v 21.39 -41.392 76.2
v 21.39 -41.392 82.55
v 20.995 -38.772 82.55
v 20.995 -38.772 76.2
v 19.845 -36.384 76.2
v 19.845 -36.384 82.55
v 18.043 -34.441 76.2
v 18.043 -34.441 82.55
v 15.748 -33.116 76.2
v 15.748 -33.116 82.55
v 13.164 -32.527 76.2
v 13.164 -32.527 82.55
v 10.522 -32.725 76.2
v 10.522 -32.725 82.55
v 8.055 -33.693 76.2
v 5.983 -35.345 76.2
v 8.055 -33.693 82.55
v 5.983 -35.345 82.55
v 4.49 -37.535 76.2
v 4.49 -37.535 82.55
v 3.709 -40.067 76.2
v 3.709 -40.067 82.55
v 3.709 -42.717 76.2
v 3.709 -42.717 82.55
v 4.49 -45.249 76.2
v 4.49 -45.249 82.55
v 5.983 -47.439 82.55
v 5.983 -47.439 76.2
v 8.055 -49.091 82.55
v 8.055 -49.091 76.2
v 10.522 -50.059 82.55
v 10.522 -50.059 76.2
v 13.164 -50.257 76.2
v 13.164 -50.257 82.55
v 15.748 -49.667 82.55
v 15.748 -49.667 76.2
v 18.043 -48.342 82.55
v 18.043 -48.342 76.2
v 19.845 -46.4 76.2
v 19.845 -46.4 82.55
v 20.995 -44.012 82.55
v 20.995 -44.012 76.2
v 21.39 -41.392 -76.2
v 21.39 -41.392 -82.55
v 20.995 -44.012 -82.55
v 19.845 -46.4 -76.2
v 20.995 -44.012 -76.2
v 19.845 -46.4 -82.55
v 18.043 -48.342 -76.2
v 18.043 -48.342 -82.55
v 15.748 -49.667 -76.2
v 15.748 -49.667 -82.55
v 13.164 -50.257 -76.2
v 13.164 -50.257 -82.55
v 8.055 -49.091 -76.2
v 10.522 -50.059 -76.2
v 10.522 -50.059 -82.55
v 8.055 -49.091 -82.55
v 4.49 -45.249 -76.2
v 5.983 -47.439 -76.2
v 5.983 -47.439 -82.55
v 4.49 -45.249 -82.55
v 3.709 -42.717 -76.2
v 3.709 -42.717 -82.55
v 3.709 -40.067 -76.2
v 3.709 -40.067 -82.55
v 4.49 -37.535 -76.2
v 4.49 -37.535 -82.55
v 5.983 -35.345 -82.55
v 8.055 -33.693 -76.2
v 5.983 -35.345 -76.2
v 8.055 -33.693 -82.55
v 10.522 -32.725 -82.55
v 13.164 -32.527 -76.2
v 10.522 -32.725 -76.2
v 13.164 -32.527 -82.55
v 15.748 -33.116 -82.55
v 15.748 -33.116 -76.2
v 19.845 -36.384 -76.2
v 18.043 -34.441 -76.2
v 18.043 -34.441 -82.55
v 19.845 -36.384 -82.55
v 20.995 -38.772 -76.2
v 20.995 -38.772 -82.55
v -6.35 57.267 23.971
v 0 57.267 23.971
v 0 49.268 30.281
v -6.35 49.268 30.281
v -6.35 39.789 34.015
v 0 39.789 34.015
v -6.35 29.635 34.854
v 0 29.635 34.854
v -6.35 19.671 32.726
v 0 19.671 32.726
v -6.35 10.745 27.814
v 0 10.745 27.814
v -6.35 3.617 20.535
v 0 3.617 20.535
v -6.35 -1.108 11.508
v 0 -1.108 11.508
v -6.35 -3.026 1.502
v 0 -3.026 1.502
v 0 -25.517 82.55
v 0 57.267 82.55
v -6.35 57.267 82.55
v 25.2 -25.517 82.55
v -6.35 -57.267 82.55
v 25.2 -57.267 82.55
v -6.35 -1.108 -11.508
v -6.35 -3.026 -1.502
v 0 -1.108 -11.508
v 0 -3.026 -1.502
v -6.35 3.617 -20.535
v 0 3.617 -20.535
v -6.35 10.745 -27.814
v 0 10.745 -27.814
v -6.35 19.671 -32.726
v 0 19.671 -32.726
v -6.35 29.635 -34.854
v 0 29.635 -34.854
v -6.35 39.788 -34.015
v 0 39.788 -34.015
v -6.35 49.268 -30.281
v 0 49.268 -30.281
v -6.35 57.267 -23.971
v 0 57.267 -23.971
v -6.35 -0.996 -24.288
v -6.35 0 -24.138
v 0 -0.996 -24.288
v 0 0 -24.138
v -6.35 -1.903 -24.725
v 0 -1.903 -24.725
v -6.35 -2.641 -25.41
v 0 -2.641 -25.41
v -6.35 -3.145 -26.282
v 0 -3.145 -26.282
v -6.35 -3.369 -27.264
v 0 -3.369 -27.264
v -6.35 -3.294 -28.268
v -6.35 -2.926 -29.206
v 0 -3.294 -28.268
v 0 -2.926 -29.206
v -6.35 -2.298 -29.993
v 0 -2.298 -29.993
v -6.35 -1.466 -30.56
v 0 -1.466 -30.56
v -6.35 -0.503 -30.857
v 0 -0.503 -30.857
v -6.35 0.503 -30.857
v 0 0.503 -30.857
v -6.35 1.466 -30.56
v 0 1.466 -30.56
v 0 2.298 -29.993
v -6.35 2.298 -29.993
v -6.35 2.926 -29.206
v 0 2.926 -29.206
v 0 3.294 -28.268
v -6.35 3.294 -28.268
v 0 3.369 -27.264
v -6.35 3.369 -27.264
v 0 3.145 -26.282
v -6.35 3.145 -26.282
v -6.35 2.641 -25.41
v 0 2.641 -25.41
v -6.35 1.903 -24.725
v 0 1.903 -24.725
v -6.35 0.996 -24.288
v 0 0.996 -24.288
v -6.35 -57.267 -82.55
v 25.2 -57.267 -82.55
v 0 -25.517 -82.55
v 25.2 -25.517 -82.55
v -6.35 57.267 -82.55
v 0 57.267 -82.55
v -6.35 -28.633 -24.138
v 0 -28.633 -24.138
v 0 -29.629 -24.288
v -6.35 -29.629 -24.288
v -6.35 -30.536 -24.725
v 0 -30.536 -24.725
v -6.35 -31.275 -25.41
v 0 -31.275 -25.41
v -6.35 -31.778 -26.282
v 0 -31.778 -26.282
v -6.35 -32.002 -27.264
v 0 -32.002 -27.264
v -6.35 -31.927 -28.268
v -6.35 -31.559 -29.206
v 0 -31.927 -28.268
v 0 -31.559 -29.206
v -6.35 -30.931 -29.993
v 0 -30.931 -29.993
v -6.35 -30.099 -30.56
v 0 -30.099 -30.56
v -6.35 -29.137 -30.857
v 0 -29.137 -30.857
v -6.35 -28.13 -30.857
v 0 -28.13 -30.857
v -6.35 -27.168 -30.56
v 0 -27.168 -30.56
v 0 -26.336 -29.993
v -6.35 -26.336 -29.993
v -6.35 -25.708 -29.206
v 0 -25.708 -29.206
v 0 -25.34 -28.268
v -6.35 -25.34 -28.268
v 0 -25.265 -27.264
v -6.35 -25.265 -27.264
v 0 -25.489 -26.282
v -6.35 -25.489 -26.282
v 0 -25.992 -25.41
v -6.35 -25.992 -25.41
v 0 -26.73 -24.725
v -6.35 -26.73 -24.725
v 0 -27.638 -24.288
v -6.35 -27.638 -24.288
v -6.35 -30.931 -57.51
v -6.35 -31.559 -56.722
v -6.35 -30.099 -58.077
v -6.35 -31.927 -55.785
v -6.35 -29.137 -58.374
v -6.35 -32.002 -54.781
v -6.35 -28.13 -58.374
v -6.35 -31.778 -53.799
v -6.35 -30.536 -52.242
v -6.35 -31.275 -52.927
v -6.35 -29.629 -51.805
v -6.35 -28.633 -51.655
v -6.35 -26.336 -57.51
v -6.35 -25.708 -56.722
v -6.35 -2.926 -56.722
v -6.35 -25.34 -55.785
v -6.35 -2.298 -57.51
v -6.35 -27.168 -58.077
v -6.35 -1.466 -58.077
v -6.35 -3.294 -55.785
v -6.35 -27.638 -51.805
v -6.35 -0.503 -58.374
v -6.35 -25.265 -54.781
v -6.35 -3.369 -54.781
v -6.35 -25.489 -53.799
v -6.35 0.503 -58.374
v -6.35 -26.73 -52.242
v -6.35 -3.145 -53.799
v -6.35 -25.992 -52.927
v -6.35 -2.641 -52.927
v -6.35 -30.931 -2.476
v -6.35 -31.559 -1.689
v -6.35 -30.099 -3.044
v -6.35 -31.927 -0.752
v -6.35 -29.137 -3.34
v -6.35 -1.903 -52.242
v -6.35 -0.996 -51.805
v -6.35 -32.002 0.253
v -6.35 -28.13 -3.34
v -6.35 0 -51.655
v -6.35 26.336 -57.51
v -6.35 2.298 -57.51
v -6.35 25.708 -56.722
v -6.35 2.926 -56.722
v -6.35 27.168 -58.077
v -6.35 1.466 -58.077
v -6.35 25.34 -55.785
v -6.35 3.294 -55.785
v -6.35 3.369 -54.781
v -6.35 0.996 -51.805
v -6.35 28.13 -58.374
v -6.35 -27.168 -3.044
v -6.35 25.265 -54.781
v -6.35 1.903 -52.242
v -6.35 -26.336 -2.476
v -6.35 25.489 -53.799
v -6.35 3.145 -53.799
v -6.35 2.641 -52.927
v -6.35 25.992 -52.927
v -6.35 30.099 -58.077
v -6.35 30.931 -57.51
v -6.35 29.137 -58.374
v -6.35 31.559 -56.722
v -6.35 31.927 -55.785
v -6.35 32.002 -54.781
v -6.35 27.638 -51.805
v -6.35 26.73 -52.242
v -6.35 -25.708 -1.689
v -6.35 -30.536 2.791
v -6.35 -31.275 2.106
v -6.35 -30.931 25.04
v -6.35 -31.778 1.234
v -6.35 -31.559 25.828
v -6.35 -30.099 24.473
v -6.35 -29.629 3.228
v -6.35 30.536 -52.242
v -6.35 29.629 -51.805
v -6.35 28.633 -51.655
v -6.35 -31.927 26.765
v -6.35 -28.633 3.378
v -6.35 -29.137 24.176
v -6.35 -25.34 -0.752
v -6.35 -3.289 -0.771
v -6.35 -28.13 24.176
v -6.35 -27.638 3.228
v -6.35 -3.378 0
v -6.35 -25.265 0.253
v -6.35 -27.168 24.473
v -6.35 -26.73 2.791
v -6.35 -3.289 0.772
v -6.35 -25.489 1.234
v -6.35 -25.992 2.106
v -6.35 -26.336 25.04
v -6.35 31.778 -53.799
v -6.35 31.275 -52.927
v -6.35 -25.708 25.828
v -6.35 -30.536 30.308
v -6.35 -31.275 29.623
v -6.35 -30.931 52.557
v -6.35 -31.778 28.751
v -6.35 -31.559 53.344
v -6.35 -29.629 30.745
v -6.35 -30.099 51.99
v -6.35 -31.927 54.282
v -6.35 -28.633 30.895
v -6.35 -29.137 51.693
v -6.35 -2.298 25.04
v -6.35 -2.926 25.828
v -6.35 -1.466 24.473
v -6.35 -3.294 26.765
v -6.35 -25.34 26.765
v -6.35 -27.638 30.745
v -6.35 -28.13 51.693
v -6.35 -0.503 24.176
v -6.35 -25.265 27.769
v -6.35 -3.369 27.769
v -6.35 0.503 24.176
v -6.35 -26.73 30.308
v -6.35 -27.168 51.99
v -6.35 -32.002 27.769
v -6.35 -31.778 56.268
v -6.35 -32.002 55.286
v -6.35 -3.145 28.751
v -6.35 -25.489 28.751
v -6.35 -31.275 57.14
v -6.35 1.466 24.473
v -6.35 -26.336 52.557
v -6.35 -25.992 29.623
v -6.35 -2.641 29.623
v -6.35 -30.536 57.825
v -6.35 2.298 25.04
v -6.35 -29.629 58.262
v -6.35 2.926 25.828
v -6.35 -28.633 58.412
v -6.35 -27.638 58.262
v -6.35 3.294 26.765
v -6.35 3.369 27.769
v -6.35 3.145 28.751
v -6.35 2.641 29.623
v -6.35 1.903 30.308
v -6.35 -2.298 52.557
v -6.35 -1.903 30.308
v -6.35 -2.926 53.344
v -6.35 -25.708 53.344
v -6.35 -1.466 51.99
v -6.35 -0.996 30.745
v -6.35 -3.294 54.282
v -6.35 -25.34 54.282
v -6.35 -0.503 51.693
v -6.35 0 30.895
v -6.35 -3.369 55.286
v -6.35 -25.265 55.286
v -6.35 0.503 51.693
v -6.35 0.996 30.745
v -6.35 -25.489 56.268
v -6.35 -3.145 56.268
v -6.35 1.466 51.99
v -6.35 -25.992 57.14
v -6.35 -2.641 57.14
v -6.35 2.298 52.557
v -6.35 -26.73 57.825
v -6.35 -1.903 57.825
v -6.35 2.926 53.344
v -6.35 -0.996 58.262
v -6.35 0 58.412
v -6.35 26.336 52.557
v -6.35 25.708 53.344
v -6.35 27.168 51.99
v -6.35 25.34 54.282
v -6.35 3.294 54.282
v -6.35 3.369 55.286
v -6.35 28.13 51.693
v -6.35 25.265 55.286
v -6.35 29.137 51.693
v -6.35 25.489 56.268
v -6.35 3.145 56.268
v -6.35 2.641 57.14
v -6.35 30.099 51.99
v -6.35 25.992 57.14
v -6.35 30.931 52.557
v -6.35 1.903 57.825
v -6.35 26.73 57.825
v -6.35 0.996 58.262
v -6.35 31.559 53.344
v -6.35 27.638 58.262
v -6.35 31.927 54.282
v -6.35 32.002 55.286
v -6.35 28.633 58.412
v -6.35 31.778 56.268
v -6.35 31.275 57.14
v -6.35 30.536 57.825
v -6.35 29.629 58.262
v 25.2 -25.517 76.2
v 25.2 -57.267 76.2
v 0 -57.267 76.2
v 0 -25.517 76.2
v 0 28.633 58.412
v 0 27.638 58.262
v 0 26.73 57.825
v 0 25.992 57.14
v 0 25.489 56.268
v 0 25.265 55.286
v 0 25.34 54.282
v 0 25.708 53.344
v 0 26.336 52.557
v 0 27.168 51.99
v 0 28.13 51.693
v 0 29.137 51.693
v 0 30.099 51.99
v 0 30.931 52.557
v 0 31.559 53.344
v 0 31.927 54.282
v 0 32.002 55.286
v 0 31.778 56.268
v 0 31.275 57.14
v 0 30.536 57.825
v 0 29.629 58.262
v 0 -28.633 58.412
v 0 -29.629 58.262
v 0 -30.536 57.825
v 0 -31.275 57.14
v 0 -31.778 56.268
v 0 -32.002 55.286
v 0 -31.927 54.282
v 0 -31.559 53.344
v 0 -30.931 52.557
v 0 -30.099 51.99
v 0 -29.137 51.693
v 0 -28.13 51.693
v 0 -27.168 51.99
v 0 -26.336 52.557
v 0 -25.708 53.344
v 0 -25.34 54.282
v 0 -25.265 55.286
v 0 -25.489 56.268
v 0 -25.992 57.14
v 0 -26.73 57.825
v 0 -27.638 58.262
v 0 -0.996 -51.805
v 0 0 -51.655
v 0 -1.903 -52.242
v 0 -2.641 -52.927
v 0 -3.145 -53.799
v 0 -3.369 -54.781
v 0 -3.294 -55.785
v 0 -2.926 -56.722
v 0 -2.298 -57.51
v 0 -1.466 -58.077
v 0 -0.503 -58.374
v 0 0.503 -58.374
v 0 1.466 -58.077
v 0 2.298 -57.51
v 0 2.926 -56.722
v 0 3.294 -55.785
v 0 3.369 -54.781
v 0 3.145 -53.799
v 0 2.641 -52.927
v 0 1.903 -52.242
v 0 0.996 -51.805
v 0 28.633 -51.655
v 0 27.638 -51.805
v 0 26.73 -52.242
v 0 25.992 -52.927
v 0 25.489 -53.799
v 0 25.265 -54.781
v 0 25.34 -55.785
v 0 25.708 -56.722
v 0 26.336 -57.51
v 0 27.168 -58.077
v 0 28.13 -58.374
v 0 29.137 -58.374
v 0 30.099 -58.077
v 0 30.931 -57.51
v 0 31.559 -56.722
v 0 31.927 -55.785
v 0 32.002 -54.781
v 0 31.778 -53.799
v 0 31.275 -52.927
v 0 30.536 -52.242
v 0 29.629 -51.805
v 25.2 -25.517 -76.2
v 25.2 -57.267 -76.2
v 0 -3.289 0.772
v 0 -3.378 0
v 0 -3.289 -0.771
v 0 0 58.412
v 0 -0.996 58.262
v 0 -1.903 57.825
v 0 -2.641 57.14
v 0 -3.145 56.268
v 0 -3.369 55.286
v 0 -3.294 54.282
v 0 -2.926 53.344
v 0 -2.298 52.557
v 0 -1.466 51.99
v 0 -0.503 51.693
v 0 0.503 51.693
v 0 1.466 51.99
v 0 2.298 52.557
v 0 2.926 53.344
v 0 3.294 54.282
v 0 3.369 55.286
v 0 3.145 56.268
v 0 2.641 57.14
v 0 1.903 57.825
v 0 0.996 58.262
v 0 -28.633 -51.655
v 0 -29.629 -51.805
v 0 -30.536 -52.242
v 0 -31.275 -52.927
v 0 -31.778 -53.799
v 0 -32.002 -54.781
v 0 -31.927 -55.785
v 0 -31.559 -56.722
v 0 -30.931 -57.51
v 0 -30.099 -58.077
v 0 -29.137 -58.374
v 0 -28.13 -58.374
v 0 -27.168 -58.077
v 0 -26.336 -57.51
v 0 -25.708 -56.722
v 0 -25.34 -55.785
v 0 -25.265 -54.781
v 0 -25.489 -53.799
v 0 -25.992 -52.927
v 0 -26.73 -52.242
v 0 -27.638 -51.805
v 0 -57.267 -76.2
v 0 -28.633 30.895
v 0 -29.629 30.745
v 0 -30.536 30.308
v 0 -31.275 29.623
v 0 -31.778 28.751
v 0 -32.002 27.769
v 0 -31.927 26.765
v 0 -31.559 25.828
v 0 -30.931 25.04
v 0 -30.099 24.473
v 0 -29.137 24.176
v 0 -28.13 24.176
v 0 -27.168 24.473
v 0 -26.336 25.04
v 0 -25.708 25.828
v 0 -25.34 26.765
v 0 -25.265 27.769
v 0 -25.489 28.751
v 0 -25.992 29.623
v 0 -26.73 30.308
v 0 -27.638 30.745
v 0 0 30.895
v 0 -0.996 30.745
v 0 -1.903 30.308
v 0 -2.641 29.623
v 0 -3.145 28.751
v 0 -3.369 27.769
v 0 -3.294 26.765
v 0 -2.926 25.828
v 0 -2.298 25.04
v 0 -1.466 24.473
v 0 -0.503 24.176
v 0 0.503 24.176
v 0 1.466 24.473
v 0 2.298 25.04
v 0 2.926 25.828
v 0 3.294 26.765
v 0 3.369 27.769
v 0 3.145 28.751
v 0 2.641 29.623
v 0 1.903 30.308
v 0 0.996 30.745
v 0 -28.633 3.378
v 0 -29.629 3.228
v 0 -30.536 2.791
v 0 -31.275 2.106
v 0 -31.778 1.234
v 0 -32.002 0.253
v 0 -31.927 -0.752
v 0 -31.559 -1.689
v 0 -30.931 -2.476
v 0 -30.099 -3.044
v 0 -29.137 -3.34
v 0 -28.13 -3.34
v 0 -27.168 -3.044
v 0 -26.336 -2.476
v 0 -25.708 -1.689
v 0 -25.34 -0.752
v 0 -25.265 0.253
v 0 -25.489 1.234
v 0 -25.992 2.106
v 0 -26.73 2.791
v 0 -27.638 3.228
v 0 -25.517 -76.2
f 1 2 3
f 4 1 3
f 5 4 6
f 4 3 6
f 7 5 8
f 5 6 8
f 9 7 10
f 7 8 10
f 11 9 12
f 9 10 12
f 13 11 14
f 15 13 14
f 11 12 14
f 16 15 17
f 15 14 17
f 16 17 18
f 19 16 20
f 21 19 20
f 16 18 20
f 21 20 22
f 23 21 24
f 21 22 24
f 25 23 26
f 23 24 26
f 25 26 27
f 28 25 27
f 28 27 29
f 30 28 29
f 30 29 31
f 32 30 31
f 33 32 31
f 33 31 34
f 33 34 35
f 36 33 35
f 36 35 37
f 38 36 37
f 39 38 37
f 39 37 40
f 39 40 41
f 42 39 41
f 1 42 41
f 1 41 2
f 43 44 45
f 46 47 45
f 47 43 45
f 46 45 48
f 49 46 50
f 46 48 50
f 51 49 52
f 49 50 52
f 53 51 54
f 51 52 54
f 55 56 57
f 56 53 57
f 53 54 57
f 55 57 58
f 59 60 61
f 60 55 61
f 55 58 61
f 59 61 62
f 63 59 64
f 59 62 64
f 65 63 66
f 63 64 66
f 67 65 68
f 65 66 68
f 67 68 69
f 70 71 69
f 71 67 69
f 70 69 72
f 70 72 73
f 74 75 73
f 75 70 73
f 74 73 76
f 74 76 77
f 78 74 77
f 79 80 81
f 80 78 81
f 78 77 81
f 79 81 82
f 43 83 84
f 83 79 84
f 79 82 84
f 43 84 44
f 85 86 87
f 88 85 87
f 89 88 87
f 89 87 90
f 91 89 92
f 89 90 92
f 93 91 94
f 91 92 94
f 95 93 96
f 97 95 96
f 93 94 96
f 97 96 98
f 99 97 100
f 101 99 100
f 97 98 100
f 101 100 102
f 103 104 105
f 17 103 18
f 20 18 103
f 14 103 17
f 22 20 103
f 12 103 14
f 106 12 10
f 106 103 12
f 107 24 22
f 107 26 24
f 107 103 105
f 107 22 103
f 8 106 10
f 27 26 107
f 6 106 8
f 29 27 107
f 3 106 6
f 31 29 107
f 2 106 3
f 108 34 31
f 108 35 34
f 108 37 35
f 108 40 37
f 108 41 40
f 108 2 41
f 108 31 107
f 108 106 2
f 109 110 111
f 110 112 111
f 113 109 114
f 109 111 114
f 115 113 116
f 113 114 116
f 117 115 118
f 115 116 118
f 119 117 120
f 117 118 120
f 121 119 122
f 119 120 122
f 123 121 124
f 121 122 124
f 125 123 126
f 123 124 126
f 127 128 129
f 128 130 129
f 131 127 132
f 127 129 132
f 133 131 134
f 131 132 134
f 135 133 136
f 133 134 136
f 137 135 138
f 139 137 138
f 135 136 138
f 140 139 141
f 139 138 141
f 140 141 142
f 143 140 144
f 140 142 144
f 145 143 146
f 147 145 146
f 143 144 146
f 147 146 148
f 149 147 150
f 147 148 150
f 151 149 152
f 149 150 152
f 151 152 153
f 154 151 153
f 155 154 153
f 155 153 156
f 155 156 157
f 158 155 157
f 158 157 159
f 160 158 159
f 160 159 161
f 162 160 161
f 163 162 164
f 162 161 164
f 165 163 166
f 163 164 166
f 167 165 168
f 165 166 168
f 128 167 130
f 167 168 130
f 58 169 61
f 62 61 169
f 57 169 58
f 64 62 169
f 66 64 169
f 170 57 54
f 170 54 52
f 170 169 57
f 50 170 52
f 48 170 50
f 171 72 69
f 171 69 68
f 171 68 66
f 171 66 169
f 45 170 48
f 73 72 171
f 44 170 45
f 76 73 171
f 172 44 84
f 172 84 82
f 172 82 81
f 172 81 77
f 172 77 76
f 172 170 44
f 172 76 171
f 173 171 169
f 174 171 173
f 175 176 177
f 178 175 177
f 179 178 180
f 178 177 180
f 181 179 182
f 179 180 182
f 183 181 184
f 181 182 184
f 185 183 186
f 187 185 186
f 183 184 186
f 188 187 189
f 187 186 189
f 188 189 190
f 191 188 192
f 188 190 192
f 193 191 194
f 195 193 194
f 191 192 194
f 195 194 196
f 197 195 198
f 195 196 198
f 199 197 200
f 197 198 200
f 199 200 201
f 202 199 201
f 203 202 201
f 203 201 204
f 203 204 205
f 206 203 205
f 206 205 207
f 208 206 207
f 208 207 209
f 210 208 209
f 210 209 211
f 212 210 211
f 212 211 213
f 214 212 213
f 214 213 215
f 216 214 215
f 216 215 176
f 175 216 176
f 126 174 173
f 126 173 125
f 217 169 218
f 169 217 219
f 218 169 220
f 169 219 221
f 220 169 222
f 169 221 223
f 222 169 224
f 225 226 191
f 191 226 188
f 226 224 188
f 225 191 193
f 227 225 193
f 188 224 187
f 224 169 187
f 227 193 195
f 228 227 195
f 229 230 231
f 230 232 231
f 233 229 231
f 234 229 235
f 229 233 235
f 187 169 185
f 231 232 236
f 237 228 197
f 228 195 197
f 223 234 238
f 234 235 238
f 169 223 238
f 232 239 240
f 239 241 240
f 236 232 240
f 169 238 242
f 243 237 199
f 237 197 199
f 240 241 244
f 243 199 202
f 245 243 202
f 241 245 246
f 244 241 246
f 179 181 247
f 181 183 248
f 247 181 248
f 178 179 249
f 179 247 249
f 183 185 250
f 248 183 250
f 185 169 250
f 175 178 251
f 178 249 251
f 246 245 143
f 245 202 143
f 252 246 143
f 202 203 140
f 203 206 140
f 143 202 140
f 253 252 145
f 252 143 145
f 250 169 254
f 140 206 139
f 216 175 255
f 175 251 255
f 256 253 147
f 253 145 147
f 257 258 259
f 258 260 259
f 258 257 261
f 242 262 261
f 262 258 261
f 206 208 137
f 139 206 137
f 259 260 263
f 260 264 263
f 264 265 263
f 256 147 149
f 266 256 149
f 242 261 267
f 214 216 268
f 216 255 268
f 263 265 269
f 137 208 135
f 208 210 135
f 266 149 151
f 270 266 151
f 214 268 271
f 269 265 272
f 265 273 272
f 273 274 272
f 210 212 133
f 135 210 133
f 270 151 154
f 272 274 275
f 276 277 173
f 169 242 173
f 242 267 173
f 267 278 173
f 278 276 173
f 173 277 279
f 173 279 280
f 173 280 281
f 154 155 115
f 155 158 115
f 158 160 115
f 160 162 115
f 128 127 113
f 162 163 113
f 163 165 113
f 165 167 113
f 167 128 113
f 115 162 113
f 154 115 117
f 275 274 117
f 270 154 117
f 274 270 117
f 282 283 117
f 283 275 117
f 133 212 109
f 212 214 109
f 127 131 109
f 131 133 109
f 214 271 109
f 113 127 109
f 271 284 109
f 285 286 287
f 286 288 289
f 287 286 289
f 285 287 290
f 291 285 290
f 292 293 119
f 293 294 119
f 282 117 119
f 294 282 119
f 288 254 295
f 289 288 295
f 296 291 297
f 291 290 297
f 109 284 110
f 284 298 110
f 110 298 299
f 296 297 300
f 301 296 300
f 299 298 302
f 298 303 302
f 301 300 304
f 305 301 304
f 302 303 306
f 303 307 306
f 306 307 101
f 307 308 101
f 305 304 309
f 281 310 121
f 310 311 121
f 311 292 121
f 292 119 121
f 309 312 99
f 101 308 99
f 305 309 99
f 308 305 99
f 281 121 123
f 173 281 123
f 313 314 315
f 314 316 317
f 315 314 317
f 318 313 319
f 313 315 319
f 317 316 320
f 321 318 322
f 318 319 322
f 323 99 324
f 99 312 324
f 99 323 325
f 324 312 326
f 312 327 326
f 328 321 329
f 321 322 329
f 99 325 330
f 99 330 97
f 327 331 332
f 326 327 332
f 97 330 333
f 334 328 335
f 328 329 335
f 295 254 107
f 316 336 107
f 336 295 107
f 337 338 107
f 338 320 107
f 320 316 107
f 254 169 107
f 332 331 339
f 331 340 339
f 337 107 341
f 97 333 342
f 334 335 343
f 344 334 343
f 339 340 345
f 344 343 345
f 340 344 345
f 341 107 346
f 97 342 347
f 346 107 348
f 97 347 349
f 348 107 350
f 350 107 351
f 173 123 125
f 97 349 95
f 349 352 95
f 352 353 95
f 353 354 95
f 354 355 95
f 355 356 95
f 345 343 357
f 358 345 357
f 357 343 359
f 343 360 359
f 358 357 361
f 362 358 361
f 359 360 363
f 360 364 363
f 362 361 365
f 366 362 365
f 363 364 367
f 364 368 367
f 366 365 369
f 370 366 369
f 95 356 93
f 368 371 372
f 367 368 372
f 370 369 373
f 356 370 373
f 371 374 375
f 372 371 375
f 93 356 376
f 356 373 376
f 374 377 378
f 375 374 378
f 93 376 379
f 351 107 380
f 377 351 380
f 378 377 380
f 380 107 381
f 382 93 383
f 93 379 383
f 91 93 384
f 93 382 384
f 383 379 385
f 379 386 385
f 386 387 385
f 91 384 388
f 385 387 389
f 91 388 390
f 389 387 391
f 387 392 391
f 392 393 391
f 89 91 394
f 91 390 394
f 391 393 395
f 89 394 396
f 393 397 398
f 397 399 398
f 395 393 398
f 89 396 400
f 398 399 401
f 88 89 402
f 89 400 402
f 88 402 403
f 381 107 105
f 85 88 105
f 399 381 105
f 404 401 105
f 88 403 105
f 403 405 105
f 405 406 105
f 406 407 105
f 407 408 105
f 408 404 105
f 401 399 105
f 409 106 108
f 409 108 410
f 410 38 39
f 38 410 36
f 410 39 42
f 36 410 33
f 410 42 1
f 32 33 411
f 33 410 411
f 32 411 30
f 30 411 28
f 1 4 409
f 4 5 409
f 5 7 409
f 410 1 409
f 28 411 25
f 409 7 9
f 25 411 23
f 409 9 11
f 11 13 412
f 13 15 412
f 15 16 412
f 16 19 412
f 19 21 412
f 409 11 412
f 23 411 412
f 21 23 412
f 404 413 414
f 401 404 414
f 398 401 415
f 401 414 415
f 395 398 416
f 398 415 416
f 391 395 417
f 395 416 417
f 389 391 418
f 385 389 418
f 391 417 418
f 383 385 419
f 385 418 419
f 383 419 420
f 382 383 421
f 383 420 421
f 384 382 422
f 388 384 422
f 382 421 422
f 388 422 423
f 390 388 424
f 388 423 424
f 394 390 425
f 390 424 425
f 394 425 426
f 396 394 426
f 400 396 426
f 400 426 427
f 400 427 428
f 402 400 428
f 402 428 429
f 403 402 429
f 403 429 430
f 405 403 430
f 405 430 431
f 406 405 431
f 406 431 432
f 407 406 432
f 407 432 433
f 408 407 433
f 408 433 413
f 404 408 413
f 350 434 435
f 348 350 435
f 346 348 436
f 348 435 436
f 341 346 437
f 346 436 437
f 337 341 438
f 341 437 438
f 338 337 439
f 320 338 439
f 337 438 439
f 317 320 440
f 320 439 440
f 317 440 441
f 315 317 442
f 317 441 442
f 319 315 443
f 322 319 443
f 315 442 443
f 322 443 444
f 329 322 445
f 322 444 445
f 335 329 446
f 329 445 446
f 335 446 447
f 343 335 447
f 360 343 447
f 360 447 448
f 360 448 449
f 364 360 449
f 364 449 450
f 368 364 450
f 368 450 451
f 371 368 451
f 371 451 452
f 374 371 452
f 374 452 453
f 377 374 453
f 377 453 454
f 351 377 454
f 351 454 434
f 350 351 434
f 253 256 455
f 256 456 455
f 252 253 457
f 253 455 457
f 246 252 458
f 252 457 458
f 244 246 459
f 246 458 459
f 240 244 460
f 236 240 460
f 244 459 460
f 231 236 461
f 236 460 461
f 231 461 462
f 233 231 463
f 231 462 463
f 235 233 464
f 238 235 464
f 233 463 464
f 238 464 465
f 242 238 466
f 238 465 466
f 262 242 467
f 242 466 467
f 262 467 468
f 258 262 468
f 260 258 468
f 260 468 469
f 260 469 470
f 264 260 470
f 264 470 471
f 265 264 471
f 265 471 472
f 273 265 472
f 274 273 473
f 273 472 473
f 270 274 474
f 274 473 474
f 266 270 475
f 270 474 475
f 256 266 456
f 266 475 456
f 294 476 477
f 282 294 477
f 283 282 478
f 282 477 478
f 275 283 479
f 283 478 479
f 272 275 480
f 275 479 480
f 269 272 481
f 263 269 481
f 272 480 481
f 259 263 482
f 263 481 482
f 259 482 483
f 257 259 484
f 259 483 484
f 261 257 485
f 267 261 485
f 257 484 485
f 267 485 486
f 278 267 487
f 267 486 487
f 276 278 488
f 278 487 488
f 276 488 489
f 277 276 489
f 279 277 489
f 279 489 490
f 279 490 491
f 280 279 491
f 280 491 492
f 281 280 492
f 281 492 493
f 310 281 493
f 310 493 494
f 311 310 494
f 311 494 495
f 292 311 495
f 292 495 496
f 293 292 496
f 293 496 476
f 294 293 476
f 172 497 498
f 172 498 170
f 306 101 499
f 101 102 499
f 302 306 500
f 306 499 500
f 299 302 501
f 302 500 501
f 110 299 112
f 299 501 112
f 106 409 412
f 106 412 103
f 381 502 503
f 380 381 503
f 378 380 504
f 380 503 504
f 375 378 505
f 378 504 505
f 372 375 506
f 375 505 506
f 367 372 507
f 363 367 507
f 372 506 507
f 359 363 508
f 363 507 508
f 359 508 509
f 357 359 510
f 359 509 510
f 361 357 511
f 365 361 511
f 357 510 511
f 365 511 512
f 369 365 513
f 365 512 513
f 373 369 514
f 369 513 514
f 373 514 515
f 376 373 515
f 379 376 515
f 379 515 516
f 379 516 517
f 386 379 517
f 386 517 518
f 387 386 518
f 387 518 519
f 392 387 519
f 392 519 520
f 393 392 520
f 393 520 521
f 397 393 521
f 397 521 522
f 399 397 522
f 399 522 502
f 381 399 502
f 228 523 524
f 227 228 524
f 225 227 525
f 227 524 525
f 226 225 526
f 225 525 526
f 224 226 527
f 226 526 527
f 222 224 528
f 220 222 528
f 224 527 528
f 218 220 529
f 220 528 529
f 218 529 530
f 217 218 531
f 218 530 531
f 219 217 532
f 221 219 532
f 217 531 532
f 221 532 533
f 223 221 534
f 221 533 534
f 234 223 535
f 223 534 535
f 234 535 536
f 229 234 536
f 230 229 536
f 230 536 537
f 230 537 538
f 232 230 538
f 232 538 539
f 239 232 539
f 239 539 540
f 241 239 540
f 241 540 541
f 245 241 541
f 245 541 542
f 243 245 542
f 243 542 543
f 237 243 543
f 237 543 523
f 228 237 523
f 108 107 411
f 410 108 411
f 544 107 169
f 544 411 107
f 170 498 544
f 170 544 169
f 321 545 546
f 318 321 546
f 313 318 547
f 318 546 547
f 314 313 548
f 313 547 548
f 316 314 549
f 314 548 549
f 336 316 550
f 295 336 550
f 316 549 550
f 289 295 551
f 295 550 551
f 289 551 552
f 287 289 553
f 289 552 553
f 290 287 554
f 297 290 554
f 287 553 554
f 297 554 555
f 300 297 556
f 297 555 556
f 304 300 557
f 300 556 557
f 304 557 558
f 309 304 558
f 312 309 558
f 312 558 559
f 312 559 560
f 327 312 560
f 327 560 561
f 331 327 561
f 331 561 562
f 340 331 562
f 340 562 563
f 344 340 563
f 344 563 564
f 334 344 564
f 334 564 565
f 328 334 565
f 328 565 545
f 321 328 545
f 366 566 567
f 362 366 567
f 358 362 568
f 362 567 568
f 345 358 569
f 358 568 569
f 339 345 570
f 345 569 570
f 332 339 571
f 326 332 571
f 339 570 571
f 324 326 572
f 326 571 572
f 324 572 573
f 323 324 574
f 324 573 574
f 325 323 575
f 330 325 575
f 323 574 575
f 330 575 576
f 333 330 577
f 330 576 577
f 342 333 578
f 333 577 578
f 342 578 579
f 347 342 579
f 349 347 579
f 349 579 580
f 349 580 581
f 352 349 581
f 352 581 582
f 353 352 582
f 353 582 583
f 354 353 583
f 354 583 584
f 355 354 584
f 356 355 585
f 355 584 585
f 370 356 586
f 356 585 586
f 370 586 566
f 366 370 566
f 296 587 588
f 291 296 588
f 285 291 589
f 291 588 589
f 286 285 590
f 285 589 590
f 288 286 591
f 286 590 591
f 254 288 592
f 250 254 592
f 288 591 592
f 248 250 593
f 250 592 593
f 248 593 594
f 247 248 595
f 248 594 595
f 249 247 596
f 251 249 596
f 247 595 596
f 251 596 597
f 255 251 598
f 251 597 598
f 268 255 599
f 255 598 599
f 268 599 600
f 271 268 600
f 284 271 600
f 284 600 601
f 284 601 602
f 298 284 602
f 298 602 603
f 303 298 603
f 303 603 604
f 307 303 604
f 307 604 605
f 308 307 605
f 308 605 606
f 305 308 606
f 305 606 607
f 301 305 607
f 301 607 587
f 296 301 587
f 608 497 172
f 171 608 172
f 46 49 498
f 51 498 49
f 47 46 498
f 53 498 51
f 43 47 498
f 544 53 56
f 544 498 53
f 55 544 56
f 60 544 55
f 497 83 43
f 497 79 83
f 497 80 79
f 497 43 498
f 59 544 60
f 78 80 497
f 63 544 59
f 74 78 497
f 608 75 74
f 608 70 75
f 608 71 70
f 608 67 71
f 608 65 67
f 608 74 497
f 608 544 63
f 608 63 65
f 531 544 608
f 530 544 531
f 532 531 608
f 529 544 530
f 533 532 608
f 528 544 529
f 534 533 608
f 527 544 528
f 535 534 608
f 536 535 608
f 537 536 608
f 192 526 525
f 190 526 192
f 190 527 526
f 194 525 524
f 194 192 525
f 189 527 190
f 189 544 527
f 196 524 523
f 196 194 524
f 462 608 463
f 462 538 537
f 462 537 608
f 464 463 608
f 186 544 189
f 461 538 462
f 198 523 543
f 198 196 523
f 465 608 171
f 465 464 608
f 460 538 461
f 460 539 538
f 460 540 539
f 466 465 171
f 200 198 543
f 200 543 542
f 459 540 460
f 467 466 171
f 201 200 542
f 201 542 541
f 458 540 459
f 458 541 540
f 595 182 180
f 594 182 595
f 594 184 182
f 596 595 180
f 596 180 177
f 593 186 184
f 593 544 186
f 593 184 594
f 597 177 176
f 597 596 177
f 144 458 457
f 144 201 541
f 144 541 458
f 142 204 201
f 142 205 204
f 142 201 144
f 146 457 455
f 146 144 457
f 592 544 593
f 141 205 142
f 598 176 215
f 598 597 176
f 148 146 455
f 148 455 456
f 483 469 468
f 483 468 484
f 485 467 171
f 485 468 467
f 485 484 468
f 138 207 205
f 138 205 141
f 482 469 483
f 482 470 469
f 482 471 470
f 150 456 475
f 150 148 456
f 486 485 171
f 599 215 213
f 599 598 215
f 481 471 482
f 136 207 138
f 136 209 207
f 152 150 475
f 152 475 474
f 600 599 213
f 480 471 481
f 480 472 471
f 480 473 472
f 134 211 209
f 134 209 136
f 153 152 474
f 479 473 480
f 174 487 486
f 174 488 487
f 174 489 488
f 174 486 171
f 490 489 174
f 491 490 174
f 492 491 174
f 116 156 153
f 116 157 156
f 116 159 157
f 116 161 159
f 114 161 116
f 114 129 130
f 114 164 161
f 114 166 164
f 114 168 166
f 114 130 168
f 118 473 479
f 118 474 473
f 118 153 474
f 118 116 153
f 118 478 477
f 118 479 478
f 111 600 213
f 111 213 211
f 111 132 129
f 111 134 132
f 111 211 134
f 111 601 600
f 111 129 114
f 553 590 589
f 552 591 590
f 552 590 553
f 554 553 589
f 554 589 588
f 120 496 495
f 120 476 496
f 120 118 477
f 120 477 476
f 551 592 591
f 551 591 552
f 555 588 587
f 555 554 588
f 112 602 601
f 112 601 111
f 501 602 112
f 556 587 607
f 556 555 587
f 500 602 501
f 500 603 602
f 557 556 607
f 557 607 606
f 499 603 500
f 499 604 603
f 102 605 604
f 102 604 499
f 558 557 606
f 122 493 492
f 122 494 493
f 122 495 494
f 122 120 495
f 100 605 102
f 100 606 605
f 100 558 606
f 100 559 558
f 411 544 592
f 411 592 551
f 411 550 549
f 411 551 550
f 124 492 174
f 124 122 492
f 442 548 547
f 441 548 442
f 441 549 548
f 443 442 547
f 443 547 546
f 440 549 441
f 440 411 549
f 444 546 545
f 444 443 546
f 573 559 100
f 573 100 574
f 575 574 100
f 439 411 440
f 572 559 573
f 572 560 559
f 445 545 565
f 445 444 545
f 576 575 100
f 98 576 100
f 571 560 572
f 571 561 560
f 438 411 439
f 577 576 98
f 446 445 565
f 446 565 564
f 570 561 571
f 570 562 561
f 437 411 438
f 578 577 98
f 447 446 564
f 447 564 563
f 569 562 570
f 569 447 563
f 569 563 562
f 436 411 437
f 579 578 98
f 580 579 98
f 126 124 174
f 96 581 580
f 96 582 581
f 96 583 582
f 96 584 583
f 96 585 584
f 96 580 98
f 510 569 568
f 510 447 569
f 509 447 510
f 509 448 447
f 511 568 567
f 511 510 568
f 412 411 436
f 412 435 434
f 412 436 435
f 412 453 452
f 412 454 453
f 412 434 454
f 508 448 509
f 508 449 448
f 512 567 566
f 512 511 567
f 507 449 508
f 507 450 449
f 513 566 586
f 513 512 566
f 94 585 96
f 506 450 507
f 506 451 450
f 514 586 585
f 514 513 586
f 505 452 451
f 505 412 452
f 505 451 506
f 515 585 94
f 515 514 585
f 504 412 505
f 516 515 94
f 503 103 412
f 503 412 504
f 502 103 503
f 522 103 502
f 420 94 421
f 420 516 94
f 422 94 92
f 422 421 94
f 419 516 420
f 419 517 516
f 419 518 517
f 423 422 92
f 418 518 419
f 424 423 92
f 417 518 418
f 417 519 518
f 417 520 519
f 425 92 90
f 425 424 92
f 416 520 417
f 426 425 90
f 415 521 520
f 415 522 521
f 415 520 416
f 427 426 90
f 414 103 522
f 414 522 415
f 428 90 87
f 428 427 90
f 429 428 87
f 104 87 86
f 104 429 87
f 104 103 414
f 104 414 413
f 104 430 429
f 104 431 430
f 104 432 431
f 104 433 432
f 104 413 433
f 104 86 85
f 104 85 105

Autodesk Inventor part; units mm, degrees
ref_plane "YZ Plane" through (0, 0, 0) normal (1, 0, 0) x (0, 1, 0)
ref_plane "XZ Plane" through (0, 0, 0) normal (0, 1, 0) x (-1, 0, 0)
ref_plane "XY Plane" through (0, 0, 0) normal (0, 0, 1) x (1, 0, 0)
sketch "Sketch1" plane through (0, 0, 0) normal (1, 0, 0) x (0, 1, 0)
  line L0 (-57.2668, 82.55) -> (-57.2668, -82.55)
  line L1 (-57.2668, -82.55) -> (57.2668, -82.55)
  line L2 (57.2668, -82.55) -> (57.2668, 82.55)
  line L3 (57.2668, 82.55) -> (-57.2668, 82.55)
  line L4 (-57.2668, 82.55) -> (57.2668, -82.55) construction
  line L5 (-57.2668, -82.55) -> (57.2668, 82.55) construction
  line L6 (57.2668, 0) -> (-57.2668, 0) construction
  circle A0 centre (31.8668, 0) radius 34.925
  line L7 (-31.8668, 82.55) -> (-31.8668, -82.55) construction
  point P0 (0, 0)
  point P1 (57.2668, -23.9707)
  point P2 (57.2668, 23.9707)
  dimension "d0" = 165.1
  dimension "d1" = 25.4
  dimension "d2" = 69.85
  dimension "d3" = 63.7337
  dimension "d4" = 25.4
extrude "Extrusion1" add sketch "Sketch1" against normal blind 6.35 contours L3 L2 A0 L1 L0
sketch "Sketch2" plane through (0, 0, 0) normal (1, 0, 0) x (0, 0, -1)
  line L0 (82.55, -57.2668) -> (-82.55, -57.2668) projected
  line L1 (-82.55, -57.2668) -> (-76.2, -57.2668)
  line L2 (-76.2, -57.2668) -> (-76.2, -25.5168)
  line L3 (-76.2, -25.5168) -> (-82.55, -25.5168)
  line L4 (-82.55, -25.5168) -> (-82.55, -57.2668)
  line L5 (82.55, -57.2668) -> (76.2, -57.2668)
  line L6 (76.2, -57.2668) -> (76.2, -25.5168)
  line L7 (76.2, -25.5168) -> (82.55, -25.5168)
  line L8 (82.55, -25.5168) -> (82.55, -57.2668)
  point P0 (0, 0)
  point P1 (76.2, -57.2668)
  dimension "d7" = 6.35
  dimension "d8" = 6.35
  dimension "d15" = 31.75
extrude "Extrusion2" add sketch "Sketch2" along normal blind 25.2001
sketch "Sketch4" plane through (-6.35, 57.2668, 82.55) normal (0, 0, 1) x (1, 0, 0)
  line L0 (31.5501, -82.7837) -> (31.5501, -114.5337) construction
  line L1 (31.5501, -98.6587) -> (0, -98.6587) construction
  line L2 (0, 0) -> (0, -114.5337) construction
  circle A0 centre (18.8501, -98.6587) radius 8.89
  point P0 (6.35, -57.2668)
  dimension "d11" = 18.8501
  dimension "d12" = 17.78
extrude "Extrusion3" cut sketch "Sketch4" against normal up to surface (6.35 mm away)
sketch "Sketch5" plane through (-6.35, 0, 0) normal (-1, 0, 0) x (0, 0, 1)
  line L0 (-82.55, 57.2668) -> (-82.55, -57.2668) projected
  line L1 (-82.55, -57.2668) -> (82.55, -57.2668) projected
  point P0 (0, 0)
  point P1 (-55.0333, -28.6334)
  dimension "d23" = 27.5167
  dimension "d24" = 28.6334
hole "Hole1" at (-6.35, -28.6334, -55.0333) direction (1, 0, 0) diameter 6.7564 end through all clearance for "Hex Head Bolt" size "1/4" standard "Ansi Unified Screw Threads"
pattern_linear "Rectangular Pattern1" count 3 spacing 28.6334 along (0, 1, 0) count 5 spacing 27.5167 along (0, 0, 1) of "Hole1"
mirror "Mirror2" about plane through (0, 0, 0) normal (0, 0, 1) of "Extrusion3"
equation "\"d0\" = forkWidth"
equation "\"d5\" = wallThickness"
equation "\"d7\" = wallThickness"
equation "\"d8\" = wallThickness"
equation "\"d9\" = centerWormGearAbovePlate + wallThickness"
equation "\"d11\" = centerWormGearAbovePlate"
equation "\"forkWidth\" = 165.1"
equation "\"centerGearToCenterWormGear\" = 73.25868"
equation "\"centerWormGearAbovePlate\" = 18.8501"
equation "\"wallThickness\" = 6.35"
equation "\"widthOfWorm\" = 38.1"
equation "\"holeFor3_8HexShaft\" = 12.7"
properties part number "plateForAzimuthKnobs"
